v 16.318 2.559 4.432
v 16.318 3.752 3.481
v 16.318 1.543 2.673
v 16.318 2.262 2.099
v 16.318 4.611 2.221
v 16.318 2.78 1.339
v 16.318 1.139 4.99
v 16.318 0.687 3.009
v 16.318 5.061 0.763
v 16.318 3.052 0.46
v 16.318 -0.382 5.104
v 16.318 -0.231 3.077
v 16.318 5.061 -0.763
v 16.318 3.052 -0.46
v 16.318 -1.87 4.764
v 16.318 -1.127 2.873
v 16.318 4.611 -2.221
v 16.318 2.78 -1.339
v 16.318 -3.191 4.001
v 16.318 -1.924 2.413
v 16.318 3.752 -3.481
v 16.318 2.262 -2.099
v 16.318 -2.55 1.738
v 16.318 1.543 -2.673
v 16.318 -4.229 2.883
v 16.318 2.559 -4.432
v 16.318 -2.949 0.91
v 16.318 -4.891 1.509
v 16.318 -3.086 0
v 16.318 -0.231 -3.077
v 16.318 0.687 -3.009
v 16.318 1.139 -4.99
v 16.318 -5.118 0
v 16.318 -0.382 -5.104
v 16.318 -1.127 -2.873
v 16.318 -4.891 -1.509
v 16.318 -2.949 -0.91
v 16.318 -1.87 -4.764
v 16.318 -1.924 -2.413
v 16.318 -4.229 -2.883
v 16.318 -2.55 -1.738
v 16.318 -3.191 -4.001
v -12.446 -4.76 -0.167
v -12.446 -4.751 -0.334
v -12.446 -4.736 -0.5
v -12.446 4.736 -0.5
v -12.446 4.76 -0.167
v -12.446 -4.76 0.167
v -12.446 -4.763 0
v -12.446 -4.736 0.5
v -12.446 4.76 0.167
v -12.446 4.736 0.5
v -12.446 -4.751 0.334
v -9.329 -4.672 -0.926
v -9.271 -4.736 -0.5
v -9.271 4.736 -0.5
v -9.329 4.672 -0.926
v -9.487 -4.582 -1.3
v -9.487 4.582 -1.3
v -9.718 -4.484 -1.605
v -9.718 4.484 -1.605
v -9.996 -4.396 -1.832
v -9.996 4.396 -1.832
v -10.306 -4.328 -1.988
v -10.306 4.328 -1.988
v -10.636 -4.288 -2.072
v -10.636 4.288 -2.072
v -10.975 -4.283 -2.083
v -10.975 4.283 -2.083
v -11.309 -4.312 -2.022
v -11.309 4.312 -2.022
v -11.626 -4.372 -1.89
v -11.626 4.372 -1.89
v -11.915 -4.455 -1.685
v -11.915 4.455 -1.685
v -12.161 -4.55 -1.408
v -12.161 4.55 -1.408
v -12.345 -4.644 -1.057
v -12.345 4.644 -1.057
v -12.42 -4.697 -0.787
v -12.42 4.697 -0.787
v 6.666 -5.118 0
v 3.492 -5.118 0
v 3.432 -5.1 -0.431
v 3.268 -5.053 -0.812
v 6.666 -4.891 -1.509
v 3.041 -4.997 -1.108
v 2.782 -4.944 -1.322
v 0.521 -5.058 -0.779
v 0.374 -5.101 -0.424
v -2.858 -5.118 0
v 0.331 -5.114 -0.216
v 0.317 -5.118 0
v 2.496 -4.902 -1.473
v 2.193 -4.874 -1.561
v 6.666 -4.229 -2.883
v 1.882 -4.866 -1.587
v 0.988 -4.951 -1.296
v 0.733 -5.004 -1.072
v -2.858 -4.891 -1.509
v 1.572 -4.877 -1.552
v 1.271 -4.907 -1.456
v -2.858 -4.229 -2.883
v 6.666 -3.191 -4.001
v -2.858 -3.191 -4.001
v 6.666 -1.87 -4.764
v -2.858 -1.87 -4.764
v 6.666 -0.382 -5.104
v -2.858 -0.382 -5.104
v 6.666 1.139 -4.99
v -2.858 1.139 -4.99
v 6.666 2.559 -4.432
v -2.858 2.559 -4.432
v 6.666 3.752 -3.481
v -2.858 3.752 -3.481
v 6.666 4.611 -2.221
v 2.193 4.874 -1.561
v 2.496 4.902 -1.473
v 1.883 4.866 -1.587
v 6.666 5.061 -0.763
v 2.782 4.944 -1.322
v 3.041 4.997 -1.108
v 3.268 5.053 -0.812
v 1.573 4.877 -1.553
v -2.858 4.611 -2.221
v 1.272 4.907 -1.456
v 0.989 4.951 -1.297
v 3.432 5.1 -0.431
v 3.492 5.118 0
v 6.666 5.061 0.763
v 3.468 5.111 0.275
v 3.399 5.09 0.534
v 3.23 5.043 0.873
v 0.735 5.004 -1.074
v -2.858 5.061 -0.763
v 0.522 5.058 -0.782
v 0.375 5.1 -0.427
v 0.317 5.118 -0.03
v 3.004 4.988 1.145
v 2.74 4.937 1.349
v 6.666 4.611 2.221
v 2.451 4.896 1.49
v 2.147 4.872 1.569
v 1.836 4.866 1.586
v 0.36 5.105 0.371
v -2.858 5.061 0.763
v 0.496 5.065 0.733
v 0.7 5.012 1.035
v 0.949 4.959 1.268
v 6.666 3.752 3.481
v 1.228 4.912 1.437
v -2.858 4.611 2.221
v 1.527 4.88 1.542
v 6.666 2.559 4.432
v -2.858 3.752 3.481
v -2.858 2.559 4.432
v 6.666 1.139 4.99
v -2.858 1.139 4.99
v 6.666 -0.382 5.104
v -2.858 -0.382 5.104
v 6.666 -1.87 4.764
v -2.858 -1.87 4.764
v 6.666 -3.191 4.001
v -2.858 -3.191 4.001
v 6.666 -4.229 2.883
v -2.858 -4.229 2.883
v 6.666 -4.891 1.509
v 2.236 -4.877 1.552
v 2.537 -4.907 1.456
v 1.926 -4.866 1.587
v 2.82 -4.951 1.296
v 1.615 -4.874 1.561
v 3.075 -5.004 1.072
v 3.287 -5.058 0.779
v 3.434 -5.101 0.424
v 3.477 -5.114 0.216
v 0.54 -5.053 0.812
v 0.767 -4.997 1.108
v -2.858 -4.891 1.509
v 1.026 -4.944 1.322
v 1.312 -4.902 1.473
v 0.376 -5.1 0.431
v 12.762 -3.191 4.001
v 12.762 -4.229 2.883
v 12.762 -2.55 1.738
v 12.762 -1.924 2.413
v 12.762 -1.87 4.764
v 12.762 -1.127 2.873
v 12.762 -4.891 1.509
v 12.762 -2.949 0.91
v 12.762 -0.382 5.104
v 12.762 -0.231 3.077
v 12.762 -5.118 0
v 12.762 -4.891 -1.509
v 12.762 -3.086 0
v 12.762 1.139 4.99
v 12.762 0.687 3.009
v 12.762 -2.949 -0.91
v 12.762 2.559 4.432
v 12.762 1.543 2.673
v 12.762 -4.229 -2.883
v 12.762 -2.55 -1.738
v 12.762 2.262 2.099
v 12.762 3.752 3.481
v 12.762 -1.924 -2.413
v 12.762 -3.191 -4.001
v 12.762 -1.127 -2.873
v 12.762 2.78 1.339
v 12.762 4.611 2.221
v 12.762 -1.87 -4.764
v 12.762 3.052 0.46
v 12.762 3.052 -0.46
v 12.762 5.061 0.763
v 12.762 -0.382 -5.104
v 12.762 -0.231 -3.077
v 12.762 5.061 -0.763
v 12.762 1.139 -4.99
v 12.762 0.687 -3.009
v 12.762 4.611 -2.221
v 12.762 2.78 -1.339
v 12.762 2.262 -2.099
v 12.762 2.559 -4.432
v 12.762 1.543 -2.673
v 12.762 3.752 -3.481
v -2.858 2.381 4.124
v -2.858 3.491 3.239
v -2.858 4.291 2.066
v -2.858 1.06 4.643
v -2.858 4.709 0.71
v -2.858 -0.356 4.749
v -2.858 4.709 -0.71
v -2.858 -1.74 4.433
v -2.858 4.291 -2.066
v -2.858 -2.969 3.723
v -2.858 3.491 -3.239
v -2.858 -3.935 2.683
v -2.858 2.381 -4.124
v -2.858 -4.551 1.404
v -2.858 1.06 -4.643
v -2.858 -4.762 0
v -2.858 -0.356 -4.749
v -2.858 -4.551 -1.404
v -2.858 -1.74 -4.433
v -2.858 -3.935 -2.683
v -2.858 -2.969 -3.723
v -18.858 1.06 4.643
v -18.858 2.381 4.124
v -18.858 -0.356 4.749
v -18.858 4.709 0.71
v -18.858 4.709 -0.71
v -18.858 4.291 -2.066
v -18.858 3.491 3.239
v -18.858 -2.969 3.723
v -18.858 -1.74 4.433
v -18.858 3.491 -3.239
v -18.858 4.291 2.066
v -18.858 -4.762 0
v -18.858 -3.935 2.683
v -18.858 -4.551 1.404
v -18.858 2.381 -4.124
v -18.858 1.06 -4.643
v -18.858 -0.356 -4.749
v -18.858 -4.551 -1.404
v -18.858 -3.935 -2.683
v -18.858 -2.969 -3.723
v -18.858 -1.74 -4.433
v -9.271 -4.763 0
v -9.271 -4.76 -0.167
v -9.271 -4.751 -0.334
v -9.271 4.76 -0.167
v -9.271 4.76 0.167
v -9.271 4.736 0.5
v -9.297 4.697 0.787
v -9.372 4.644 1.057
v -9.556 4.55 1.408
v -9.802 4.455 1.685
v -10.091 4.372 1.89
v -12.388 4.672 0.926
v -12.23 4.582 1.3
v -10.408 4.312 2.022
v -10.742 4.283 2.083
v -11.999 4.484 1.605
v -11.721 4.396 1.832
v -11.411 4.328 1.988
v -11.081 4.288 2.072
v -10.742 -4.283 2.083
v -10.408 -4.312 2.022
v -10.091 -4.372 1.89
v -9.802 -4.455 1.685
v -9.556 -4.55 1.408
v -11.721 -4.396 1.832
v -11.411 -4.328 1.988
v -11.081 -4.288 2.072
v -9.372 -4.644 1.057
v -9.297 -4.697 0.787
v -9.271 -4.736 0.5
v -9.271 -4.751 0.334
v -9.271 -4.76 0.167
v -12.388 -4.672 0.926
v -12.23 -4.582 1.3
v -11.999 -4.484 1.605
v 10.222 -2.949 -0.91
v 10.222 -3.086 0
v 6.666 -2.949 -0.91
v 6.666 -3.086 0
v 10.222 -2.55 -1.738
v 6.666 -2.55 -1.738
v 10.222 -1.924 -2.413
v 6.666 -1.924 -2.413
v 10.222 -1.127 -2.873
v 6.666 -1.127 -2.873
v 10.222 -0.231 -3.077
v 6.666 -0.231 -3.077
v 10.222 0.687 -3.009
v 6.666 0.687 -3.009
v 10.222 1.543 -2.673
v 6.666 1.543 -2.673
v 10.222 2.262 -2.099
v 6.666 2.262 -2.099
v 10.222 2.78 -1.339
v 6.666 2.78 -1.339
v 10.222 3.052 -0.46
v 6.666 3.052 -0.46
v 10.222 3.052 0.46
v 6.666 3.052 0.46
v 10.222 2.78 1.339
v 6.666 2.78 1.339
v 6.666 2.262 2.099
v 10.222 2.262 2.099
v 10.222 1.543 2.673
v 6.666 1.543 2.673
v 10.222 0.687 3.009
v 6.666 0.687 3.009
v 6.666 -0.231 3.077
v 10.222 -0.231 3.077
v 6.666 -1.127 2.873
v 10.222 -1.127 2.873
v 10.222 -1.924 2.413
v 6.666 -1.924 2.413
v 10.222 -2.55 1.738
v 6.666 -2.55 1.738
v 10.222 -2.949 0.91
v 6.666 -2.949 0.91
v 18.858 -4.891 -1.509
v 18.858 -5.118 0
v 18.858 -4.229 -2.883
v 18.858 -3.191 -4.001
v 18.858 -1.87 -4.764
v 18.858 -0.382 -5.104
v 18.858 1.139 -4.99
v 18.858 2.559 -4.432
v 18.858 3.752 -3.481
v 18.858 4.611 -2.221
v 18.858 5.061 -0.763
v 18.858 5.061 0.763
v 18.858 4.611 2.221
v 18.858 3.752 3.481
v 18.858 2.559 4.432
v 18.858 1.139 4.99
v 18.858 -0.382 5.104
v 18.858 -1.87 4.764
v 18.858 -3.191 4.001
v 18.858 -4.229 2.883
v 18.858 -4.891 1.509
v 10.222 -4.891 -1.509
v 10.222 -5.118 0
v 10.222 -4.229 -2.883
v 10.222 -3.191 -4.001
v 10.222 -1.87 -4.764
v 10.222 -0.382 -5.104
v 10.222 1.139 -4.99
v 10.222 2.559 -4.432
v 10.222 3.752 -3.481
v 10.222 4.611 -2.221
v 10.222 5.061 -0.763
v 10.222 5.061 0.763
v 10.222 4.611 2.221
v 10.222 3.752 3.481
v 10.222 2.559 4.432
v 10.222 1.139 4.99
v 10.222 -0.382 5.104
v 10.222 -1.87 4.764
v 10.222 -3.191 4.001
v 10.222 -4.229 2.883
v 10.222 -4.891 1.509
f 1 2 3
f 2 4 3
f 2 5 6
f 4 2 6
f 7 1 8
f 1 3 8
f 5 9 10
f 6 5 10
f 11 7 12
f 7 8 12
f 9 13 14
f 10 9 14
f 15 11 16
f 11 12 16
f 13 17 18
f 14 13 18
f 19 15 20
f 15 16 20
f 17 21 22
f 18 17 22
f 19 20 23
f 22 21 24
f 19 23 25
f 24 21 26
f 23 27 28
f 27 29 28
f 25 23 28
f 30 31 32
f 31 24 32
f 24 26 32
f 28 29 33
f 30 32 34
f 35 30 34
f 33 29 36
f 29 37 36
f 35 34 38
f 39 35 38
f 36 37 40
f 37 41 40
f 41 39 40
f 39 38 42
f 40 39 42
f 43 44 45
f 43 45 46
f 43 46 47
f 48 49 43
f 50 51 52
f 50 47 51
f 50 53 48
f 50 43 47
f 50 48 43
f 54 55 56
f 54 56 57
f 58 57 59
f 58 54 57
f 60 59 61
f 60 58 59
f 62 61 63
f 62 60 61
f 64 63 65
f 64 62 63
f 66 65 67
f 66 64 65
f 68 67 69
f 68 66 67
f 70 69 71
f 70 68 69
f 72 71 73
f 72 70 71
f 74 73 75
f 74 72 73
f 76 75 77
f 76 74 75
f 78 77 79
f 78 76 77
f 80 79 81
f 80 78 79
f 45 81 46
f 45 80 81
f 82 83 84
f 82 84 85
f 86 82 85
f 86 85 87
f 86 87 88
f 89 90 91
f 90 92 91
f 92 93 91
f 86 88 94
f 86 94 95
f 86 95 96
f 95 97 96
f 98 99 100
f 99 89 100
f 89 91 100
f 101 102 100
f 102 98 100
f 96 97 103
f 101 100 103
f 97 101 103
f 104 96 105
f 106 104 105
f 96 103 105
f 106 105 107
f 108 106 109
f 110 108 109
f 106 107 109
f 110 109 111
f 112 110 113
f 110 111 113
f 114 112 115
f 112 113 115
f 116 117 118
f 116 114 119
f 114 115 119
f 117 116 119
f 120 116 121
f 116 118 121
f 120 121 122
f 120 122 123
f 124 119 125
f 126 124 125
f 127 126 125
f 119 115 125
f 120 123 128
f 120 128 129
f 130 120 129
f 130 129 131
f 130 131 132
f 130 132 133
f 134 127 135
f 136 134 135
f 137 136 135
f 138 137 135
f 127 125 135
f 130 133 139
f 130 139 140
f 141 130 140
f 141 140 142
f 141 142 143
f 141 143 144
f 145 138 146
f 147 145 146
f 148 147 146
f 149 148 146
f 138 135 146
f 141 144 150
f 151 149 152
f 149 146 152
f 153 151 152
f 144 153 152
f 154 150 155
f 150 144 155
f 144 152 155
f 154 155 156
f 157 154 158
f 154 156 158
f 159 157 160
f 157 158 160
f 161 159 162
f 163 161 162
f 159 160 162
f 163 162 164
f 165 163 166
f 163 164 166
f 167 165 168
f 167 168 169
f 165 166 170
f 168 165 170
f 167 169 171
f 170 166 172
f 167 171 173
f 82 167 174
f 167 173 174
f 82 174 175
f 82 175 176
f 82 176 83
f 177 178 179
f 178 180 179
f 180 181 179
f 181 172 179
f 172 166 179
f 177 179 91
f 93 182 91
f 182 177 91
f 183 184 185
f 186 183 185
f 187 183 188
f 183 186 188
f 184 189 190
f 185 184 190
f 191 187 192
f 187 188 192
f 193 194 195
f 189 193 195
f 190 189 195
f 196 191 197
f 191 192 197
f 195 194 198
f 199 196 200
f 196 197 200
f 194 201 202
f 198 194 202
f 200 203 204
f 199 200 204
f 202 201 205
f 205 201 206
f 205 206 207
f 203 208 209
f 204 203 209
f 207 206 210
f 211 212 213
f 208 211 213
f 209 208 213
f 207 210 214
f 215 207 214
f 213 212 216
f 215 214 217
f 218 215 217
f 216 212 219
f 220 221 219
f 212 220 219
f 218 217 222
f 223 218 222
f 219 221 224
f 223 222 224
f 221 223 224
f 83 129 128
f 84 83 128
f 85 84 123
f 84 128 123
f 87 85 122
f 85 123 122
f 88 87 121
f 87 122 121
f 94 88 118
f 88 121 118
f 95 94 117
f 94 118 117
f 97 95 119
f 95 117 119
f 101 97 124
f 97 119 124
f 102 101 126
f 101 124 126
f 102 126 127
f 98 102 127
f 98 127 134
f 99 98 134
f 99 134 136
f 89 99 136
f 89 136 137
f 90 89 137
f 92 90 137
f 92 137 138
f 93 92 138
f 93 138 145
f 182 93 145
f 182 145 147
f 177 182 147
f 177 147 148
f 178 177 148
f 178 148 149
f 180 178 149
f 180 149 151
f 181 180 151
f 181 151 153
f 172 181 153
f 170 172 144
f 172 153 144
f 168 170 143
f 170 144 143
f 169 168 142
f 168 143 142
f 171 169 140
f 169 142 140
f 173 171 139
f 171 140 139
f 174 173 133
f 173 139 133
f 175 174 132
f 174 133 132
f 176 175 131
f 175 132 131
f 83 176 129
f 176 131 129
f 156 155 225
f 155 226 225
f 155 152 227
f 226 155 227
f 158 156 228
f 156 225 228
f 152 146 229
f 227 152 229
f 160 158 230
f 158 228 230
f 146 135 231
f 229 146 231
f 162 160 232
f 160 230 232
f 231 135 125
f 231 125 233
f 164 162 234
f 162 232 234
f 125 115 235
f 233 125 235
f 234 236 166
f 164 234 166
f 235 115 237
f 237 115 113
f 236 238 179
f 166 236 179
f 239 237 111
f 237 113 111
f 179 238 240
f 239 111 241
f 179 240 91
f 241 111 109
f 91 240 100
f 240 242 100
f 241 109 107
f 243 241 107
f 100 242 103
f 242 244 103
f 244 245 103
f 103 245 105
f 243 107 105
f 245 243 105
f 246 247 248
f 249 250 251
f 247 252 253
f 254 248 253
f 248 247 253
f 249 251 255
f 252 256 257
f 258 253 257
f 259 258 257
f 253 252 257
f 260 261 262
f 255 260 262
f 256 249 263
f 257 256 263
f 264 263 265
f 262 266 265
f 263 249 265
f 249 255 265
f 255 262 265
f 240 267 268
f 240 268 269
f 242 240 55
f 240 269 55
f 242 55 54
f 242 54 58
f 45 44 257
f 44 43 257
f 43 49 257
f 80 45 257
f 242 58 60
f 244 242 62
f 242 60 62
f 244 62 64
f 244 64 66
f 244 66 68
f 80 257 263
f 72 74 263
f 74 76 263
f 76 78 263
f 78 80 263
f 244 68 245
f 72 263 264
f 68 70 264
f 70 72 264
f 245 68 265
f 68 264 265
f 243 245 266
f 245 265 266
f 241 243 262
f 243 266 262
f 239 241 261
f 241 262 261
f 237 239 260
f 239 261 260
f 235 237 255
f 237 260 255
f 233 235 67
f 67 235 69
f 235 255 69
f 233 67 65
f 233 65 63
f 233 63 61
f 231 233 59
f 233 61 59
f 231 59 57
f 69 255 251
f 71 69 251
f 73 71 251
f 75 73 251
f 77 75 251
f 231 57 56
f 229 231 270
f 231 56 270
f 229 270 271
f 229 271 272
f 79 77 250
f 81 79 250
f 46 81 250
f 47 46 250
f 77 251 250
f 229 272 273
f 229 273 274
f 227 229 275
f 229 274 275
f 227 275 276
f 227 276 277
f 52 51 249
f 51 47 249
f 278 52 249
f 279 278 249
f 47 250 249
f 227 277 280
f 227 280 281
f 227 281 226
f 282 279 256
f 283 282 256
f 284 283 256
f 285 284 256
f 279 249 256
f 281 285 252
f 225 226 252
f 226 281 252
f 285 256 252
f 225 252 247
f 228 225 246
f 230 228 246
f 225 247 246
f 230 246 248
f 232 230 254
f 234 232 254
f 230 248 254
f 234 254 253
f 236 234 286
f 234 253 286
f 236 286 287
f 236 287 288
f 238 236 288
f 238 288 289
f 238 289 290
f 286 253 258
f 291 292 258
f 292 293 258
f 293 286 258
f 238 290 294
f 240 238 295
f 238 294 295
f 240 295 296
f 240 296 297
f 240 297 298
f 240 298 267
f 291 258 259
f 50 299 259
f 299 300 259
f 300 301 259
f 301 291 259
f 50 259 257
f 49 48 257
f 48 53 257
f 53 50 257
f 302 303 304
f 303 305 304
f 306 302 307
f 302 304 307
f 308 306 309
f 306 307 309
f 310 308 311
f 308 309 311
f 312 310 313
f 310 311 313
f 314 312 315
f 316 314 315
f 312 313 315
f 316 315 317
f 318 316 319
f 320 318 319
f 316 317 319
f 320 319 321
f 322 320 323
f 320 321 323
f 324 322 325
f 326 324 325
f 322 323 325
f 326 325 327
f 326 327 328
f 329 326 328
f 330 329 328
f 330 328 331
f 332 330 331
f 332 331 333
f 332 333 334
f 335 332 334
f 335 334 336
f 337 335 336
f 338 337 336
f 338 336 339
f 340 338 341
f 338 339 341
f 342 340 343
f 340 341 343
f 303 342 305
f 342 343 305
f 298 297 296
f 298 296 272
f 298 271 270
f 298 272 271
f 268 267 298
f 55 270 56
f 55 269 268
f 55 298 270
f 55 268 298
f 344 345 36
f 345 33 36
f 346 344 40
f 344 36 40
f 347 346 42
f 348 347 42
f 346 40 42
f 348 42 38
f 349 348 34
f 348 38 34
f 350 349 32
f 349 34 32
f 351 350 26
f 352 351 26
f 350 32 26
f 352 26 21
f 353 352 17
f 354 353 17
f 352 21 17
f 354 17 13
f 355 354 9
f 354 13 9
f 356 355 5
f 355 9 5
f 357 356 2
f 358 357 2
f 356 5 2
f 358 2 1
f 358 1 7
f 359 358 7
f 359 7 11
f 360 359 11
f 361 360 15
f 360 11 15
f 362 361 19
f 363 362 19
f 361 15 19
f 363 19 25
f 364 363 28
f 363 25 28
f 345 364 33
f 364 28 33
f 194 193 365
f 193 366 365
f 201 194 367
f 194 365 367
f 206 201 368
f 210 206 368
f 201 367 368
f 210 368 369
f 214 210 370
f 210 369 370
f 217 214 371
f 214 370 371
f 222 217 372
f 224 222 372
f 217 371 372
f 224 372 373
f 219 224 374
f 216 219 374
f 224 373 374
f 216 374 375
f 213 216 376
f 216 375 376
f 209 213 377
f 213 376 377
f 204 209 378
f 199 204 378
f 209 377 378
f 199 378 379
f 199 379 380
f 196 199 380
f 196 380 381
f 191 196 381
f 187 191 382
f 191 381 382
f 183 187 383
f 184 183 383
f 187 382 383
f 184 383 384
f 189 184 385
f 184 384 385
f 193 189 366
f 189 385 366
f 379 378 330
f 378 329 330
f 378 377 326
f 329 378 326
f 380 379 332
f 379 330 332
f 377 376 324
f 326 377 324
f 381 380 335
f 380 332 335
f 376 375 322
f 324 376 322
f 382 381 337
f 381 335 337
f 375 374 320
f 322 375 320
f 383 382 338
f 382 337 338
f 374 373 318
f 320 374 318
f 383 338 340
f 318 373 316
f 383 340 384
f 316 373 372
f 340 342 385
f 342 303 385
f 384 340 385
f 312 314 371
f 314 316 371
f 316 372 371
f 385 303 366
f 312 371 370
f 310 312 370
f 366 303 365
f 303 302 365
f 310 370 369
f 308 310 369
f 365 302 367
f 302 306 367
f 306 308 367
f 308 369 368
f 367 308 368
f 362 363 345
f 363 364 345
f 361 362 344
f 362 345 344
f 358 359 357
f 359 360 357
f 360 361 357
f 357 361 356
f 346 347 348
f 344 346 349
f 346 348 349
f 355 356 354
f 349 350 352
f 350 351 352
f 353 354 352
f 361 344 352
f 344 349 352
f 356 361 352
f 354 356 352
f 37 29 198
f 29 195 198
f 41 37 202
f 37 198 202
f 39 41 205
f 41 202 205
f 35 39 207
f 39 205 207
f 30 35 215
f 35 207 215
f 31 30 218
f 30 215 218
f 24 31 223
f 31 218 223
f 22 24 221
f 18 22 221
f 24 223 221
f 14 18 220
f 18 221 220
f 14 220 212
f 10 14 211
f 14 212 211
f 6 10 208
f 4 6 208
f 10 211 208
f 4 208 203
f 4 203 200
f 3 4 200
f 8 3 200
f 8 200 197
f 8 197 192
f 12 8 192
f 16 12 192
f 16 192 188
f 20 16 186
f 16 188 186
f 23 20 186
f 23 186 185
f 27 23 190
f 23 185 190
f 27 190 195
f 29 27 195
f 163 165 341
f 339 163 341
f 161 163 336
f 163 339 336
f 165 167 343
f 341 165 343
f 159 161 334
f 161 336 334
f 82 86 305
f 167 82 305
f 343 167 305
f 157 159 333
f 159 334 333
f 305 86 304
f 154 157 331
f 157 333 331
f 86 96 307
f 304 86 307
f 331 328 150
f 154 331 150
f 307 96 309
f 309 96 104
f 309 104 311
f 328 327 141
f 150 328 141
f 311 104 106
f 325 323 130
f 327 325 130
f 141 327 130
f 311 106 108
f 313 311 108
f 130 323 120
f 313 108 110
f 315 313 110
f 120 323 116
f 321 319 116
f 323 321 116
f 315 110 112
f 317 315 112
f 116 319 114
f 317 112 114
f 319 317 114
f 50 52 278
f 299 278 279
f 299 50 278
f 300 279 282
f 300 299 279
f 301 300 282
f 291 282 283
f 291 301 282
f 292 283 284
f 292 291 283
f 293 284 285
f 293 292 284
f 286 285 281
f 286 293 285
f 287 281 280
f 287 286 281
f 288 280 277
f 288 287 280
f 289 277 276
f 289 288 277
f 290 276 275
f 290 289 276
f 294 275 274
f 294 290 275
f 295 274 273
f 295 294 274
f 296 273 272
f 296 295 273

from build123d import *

# Parameters (mm, degrees)
F_1_8_0_125_DIAMETER_HOLE1_D   = 3.175
F_1_8_START                    = -4.7625001
F_1_8_0_1250_DOWEL_SLOT1_DEPTH = 9.5250001


# Read off the part's stored shape, not the designer's step: 1/8 (0.1250) Dowel Slot1
with BuildPart() as part:
    # Sketch1 → Revolve1 (revolve)
    with BuildSketch(Plane.XY, mode=Mode.PRIVATE) as revolve1_sk:
        Polygon((-18.8585, 0), (18.8585, 0), (18.8585, 5.1181), (16.3185, 5.1181), (16.3185, 3.0861), (12.7625, 3.0861), (12.7625, 5.1181), (10.2225, 5.1181), (10.2225, 3.0861), (6.6665, 3.0861), (6.6665, 5.1181), (-2.8585, 5.1181), (-2.8585, 4.7625), (-18.8585, 4.7625), align=None)
    revolve(revolve1_sk.sketch.rotate(Axis((-18.8585, 0, 0), (1, 0, 0)), 180), axis=Axis((-18.8585, 0, 0), (1, 0, 0)))

    # 1/8 (0.125) Diameter Hole1 (through all)
    with Locations(Plane(origin=(0, -5.1181, 0), x_dir=(-1, 0, 0), z_dir=(0, -1, 0))):
        with Locations((-1.904, 0)):
            Hole(F_1_8_0_125_DIAMETER_HOLE1_D / 2)

    # 1/8 (0.1250) Dowel Slot1 outline → 1/8 (0.1250) Dowel Slot1 (cut)
    with BuildSketch(Plane(origin=(0, 0, 0), x_dir=(1, 0, 0), z_dir=(0, 1, 0)).offset(F_1_8_START)):
        with BuildLine():
            ThreePointArc((-9.271, 0.499999), (-10.8585, 2.087499), (-12.446, 0.499999))
            Line((-12.446, 0.499999), (-12.446, -0.499999))
            ThreePointArc((-12.446, -0.499999), (-10.8585, -2.087499), (-9.271, -0.499999))
            Line((-9.271, -0.499999), (-9.271, 0.499999))
        make_face()
    extrude(amount=F_1_8_0_1250_DOWEL_SLOT1_DEPTH, mode=Mode.SUBTRACT)


solid = part.part
